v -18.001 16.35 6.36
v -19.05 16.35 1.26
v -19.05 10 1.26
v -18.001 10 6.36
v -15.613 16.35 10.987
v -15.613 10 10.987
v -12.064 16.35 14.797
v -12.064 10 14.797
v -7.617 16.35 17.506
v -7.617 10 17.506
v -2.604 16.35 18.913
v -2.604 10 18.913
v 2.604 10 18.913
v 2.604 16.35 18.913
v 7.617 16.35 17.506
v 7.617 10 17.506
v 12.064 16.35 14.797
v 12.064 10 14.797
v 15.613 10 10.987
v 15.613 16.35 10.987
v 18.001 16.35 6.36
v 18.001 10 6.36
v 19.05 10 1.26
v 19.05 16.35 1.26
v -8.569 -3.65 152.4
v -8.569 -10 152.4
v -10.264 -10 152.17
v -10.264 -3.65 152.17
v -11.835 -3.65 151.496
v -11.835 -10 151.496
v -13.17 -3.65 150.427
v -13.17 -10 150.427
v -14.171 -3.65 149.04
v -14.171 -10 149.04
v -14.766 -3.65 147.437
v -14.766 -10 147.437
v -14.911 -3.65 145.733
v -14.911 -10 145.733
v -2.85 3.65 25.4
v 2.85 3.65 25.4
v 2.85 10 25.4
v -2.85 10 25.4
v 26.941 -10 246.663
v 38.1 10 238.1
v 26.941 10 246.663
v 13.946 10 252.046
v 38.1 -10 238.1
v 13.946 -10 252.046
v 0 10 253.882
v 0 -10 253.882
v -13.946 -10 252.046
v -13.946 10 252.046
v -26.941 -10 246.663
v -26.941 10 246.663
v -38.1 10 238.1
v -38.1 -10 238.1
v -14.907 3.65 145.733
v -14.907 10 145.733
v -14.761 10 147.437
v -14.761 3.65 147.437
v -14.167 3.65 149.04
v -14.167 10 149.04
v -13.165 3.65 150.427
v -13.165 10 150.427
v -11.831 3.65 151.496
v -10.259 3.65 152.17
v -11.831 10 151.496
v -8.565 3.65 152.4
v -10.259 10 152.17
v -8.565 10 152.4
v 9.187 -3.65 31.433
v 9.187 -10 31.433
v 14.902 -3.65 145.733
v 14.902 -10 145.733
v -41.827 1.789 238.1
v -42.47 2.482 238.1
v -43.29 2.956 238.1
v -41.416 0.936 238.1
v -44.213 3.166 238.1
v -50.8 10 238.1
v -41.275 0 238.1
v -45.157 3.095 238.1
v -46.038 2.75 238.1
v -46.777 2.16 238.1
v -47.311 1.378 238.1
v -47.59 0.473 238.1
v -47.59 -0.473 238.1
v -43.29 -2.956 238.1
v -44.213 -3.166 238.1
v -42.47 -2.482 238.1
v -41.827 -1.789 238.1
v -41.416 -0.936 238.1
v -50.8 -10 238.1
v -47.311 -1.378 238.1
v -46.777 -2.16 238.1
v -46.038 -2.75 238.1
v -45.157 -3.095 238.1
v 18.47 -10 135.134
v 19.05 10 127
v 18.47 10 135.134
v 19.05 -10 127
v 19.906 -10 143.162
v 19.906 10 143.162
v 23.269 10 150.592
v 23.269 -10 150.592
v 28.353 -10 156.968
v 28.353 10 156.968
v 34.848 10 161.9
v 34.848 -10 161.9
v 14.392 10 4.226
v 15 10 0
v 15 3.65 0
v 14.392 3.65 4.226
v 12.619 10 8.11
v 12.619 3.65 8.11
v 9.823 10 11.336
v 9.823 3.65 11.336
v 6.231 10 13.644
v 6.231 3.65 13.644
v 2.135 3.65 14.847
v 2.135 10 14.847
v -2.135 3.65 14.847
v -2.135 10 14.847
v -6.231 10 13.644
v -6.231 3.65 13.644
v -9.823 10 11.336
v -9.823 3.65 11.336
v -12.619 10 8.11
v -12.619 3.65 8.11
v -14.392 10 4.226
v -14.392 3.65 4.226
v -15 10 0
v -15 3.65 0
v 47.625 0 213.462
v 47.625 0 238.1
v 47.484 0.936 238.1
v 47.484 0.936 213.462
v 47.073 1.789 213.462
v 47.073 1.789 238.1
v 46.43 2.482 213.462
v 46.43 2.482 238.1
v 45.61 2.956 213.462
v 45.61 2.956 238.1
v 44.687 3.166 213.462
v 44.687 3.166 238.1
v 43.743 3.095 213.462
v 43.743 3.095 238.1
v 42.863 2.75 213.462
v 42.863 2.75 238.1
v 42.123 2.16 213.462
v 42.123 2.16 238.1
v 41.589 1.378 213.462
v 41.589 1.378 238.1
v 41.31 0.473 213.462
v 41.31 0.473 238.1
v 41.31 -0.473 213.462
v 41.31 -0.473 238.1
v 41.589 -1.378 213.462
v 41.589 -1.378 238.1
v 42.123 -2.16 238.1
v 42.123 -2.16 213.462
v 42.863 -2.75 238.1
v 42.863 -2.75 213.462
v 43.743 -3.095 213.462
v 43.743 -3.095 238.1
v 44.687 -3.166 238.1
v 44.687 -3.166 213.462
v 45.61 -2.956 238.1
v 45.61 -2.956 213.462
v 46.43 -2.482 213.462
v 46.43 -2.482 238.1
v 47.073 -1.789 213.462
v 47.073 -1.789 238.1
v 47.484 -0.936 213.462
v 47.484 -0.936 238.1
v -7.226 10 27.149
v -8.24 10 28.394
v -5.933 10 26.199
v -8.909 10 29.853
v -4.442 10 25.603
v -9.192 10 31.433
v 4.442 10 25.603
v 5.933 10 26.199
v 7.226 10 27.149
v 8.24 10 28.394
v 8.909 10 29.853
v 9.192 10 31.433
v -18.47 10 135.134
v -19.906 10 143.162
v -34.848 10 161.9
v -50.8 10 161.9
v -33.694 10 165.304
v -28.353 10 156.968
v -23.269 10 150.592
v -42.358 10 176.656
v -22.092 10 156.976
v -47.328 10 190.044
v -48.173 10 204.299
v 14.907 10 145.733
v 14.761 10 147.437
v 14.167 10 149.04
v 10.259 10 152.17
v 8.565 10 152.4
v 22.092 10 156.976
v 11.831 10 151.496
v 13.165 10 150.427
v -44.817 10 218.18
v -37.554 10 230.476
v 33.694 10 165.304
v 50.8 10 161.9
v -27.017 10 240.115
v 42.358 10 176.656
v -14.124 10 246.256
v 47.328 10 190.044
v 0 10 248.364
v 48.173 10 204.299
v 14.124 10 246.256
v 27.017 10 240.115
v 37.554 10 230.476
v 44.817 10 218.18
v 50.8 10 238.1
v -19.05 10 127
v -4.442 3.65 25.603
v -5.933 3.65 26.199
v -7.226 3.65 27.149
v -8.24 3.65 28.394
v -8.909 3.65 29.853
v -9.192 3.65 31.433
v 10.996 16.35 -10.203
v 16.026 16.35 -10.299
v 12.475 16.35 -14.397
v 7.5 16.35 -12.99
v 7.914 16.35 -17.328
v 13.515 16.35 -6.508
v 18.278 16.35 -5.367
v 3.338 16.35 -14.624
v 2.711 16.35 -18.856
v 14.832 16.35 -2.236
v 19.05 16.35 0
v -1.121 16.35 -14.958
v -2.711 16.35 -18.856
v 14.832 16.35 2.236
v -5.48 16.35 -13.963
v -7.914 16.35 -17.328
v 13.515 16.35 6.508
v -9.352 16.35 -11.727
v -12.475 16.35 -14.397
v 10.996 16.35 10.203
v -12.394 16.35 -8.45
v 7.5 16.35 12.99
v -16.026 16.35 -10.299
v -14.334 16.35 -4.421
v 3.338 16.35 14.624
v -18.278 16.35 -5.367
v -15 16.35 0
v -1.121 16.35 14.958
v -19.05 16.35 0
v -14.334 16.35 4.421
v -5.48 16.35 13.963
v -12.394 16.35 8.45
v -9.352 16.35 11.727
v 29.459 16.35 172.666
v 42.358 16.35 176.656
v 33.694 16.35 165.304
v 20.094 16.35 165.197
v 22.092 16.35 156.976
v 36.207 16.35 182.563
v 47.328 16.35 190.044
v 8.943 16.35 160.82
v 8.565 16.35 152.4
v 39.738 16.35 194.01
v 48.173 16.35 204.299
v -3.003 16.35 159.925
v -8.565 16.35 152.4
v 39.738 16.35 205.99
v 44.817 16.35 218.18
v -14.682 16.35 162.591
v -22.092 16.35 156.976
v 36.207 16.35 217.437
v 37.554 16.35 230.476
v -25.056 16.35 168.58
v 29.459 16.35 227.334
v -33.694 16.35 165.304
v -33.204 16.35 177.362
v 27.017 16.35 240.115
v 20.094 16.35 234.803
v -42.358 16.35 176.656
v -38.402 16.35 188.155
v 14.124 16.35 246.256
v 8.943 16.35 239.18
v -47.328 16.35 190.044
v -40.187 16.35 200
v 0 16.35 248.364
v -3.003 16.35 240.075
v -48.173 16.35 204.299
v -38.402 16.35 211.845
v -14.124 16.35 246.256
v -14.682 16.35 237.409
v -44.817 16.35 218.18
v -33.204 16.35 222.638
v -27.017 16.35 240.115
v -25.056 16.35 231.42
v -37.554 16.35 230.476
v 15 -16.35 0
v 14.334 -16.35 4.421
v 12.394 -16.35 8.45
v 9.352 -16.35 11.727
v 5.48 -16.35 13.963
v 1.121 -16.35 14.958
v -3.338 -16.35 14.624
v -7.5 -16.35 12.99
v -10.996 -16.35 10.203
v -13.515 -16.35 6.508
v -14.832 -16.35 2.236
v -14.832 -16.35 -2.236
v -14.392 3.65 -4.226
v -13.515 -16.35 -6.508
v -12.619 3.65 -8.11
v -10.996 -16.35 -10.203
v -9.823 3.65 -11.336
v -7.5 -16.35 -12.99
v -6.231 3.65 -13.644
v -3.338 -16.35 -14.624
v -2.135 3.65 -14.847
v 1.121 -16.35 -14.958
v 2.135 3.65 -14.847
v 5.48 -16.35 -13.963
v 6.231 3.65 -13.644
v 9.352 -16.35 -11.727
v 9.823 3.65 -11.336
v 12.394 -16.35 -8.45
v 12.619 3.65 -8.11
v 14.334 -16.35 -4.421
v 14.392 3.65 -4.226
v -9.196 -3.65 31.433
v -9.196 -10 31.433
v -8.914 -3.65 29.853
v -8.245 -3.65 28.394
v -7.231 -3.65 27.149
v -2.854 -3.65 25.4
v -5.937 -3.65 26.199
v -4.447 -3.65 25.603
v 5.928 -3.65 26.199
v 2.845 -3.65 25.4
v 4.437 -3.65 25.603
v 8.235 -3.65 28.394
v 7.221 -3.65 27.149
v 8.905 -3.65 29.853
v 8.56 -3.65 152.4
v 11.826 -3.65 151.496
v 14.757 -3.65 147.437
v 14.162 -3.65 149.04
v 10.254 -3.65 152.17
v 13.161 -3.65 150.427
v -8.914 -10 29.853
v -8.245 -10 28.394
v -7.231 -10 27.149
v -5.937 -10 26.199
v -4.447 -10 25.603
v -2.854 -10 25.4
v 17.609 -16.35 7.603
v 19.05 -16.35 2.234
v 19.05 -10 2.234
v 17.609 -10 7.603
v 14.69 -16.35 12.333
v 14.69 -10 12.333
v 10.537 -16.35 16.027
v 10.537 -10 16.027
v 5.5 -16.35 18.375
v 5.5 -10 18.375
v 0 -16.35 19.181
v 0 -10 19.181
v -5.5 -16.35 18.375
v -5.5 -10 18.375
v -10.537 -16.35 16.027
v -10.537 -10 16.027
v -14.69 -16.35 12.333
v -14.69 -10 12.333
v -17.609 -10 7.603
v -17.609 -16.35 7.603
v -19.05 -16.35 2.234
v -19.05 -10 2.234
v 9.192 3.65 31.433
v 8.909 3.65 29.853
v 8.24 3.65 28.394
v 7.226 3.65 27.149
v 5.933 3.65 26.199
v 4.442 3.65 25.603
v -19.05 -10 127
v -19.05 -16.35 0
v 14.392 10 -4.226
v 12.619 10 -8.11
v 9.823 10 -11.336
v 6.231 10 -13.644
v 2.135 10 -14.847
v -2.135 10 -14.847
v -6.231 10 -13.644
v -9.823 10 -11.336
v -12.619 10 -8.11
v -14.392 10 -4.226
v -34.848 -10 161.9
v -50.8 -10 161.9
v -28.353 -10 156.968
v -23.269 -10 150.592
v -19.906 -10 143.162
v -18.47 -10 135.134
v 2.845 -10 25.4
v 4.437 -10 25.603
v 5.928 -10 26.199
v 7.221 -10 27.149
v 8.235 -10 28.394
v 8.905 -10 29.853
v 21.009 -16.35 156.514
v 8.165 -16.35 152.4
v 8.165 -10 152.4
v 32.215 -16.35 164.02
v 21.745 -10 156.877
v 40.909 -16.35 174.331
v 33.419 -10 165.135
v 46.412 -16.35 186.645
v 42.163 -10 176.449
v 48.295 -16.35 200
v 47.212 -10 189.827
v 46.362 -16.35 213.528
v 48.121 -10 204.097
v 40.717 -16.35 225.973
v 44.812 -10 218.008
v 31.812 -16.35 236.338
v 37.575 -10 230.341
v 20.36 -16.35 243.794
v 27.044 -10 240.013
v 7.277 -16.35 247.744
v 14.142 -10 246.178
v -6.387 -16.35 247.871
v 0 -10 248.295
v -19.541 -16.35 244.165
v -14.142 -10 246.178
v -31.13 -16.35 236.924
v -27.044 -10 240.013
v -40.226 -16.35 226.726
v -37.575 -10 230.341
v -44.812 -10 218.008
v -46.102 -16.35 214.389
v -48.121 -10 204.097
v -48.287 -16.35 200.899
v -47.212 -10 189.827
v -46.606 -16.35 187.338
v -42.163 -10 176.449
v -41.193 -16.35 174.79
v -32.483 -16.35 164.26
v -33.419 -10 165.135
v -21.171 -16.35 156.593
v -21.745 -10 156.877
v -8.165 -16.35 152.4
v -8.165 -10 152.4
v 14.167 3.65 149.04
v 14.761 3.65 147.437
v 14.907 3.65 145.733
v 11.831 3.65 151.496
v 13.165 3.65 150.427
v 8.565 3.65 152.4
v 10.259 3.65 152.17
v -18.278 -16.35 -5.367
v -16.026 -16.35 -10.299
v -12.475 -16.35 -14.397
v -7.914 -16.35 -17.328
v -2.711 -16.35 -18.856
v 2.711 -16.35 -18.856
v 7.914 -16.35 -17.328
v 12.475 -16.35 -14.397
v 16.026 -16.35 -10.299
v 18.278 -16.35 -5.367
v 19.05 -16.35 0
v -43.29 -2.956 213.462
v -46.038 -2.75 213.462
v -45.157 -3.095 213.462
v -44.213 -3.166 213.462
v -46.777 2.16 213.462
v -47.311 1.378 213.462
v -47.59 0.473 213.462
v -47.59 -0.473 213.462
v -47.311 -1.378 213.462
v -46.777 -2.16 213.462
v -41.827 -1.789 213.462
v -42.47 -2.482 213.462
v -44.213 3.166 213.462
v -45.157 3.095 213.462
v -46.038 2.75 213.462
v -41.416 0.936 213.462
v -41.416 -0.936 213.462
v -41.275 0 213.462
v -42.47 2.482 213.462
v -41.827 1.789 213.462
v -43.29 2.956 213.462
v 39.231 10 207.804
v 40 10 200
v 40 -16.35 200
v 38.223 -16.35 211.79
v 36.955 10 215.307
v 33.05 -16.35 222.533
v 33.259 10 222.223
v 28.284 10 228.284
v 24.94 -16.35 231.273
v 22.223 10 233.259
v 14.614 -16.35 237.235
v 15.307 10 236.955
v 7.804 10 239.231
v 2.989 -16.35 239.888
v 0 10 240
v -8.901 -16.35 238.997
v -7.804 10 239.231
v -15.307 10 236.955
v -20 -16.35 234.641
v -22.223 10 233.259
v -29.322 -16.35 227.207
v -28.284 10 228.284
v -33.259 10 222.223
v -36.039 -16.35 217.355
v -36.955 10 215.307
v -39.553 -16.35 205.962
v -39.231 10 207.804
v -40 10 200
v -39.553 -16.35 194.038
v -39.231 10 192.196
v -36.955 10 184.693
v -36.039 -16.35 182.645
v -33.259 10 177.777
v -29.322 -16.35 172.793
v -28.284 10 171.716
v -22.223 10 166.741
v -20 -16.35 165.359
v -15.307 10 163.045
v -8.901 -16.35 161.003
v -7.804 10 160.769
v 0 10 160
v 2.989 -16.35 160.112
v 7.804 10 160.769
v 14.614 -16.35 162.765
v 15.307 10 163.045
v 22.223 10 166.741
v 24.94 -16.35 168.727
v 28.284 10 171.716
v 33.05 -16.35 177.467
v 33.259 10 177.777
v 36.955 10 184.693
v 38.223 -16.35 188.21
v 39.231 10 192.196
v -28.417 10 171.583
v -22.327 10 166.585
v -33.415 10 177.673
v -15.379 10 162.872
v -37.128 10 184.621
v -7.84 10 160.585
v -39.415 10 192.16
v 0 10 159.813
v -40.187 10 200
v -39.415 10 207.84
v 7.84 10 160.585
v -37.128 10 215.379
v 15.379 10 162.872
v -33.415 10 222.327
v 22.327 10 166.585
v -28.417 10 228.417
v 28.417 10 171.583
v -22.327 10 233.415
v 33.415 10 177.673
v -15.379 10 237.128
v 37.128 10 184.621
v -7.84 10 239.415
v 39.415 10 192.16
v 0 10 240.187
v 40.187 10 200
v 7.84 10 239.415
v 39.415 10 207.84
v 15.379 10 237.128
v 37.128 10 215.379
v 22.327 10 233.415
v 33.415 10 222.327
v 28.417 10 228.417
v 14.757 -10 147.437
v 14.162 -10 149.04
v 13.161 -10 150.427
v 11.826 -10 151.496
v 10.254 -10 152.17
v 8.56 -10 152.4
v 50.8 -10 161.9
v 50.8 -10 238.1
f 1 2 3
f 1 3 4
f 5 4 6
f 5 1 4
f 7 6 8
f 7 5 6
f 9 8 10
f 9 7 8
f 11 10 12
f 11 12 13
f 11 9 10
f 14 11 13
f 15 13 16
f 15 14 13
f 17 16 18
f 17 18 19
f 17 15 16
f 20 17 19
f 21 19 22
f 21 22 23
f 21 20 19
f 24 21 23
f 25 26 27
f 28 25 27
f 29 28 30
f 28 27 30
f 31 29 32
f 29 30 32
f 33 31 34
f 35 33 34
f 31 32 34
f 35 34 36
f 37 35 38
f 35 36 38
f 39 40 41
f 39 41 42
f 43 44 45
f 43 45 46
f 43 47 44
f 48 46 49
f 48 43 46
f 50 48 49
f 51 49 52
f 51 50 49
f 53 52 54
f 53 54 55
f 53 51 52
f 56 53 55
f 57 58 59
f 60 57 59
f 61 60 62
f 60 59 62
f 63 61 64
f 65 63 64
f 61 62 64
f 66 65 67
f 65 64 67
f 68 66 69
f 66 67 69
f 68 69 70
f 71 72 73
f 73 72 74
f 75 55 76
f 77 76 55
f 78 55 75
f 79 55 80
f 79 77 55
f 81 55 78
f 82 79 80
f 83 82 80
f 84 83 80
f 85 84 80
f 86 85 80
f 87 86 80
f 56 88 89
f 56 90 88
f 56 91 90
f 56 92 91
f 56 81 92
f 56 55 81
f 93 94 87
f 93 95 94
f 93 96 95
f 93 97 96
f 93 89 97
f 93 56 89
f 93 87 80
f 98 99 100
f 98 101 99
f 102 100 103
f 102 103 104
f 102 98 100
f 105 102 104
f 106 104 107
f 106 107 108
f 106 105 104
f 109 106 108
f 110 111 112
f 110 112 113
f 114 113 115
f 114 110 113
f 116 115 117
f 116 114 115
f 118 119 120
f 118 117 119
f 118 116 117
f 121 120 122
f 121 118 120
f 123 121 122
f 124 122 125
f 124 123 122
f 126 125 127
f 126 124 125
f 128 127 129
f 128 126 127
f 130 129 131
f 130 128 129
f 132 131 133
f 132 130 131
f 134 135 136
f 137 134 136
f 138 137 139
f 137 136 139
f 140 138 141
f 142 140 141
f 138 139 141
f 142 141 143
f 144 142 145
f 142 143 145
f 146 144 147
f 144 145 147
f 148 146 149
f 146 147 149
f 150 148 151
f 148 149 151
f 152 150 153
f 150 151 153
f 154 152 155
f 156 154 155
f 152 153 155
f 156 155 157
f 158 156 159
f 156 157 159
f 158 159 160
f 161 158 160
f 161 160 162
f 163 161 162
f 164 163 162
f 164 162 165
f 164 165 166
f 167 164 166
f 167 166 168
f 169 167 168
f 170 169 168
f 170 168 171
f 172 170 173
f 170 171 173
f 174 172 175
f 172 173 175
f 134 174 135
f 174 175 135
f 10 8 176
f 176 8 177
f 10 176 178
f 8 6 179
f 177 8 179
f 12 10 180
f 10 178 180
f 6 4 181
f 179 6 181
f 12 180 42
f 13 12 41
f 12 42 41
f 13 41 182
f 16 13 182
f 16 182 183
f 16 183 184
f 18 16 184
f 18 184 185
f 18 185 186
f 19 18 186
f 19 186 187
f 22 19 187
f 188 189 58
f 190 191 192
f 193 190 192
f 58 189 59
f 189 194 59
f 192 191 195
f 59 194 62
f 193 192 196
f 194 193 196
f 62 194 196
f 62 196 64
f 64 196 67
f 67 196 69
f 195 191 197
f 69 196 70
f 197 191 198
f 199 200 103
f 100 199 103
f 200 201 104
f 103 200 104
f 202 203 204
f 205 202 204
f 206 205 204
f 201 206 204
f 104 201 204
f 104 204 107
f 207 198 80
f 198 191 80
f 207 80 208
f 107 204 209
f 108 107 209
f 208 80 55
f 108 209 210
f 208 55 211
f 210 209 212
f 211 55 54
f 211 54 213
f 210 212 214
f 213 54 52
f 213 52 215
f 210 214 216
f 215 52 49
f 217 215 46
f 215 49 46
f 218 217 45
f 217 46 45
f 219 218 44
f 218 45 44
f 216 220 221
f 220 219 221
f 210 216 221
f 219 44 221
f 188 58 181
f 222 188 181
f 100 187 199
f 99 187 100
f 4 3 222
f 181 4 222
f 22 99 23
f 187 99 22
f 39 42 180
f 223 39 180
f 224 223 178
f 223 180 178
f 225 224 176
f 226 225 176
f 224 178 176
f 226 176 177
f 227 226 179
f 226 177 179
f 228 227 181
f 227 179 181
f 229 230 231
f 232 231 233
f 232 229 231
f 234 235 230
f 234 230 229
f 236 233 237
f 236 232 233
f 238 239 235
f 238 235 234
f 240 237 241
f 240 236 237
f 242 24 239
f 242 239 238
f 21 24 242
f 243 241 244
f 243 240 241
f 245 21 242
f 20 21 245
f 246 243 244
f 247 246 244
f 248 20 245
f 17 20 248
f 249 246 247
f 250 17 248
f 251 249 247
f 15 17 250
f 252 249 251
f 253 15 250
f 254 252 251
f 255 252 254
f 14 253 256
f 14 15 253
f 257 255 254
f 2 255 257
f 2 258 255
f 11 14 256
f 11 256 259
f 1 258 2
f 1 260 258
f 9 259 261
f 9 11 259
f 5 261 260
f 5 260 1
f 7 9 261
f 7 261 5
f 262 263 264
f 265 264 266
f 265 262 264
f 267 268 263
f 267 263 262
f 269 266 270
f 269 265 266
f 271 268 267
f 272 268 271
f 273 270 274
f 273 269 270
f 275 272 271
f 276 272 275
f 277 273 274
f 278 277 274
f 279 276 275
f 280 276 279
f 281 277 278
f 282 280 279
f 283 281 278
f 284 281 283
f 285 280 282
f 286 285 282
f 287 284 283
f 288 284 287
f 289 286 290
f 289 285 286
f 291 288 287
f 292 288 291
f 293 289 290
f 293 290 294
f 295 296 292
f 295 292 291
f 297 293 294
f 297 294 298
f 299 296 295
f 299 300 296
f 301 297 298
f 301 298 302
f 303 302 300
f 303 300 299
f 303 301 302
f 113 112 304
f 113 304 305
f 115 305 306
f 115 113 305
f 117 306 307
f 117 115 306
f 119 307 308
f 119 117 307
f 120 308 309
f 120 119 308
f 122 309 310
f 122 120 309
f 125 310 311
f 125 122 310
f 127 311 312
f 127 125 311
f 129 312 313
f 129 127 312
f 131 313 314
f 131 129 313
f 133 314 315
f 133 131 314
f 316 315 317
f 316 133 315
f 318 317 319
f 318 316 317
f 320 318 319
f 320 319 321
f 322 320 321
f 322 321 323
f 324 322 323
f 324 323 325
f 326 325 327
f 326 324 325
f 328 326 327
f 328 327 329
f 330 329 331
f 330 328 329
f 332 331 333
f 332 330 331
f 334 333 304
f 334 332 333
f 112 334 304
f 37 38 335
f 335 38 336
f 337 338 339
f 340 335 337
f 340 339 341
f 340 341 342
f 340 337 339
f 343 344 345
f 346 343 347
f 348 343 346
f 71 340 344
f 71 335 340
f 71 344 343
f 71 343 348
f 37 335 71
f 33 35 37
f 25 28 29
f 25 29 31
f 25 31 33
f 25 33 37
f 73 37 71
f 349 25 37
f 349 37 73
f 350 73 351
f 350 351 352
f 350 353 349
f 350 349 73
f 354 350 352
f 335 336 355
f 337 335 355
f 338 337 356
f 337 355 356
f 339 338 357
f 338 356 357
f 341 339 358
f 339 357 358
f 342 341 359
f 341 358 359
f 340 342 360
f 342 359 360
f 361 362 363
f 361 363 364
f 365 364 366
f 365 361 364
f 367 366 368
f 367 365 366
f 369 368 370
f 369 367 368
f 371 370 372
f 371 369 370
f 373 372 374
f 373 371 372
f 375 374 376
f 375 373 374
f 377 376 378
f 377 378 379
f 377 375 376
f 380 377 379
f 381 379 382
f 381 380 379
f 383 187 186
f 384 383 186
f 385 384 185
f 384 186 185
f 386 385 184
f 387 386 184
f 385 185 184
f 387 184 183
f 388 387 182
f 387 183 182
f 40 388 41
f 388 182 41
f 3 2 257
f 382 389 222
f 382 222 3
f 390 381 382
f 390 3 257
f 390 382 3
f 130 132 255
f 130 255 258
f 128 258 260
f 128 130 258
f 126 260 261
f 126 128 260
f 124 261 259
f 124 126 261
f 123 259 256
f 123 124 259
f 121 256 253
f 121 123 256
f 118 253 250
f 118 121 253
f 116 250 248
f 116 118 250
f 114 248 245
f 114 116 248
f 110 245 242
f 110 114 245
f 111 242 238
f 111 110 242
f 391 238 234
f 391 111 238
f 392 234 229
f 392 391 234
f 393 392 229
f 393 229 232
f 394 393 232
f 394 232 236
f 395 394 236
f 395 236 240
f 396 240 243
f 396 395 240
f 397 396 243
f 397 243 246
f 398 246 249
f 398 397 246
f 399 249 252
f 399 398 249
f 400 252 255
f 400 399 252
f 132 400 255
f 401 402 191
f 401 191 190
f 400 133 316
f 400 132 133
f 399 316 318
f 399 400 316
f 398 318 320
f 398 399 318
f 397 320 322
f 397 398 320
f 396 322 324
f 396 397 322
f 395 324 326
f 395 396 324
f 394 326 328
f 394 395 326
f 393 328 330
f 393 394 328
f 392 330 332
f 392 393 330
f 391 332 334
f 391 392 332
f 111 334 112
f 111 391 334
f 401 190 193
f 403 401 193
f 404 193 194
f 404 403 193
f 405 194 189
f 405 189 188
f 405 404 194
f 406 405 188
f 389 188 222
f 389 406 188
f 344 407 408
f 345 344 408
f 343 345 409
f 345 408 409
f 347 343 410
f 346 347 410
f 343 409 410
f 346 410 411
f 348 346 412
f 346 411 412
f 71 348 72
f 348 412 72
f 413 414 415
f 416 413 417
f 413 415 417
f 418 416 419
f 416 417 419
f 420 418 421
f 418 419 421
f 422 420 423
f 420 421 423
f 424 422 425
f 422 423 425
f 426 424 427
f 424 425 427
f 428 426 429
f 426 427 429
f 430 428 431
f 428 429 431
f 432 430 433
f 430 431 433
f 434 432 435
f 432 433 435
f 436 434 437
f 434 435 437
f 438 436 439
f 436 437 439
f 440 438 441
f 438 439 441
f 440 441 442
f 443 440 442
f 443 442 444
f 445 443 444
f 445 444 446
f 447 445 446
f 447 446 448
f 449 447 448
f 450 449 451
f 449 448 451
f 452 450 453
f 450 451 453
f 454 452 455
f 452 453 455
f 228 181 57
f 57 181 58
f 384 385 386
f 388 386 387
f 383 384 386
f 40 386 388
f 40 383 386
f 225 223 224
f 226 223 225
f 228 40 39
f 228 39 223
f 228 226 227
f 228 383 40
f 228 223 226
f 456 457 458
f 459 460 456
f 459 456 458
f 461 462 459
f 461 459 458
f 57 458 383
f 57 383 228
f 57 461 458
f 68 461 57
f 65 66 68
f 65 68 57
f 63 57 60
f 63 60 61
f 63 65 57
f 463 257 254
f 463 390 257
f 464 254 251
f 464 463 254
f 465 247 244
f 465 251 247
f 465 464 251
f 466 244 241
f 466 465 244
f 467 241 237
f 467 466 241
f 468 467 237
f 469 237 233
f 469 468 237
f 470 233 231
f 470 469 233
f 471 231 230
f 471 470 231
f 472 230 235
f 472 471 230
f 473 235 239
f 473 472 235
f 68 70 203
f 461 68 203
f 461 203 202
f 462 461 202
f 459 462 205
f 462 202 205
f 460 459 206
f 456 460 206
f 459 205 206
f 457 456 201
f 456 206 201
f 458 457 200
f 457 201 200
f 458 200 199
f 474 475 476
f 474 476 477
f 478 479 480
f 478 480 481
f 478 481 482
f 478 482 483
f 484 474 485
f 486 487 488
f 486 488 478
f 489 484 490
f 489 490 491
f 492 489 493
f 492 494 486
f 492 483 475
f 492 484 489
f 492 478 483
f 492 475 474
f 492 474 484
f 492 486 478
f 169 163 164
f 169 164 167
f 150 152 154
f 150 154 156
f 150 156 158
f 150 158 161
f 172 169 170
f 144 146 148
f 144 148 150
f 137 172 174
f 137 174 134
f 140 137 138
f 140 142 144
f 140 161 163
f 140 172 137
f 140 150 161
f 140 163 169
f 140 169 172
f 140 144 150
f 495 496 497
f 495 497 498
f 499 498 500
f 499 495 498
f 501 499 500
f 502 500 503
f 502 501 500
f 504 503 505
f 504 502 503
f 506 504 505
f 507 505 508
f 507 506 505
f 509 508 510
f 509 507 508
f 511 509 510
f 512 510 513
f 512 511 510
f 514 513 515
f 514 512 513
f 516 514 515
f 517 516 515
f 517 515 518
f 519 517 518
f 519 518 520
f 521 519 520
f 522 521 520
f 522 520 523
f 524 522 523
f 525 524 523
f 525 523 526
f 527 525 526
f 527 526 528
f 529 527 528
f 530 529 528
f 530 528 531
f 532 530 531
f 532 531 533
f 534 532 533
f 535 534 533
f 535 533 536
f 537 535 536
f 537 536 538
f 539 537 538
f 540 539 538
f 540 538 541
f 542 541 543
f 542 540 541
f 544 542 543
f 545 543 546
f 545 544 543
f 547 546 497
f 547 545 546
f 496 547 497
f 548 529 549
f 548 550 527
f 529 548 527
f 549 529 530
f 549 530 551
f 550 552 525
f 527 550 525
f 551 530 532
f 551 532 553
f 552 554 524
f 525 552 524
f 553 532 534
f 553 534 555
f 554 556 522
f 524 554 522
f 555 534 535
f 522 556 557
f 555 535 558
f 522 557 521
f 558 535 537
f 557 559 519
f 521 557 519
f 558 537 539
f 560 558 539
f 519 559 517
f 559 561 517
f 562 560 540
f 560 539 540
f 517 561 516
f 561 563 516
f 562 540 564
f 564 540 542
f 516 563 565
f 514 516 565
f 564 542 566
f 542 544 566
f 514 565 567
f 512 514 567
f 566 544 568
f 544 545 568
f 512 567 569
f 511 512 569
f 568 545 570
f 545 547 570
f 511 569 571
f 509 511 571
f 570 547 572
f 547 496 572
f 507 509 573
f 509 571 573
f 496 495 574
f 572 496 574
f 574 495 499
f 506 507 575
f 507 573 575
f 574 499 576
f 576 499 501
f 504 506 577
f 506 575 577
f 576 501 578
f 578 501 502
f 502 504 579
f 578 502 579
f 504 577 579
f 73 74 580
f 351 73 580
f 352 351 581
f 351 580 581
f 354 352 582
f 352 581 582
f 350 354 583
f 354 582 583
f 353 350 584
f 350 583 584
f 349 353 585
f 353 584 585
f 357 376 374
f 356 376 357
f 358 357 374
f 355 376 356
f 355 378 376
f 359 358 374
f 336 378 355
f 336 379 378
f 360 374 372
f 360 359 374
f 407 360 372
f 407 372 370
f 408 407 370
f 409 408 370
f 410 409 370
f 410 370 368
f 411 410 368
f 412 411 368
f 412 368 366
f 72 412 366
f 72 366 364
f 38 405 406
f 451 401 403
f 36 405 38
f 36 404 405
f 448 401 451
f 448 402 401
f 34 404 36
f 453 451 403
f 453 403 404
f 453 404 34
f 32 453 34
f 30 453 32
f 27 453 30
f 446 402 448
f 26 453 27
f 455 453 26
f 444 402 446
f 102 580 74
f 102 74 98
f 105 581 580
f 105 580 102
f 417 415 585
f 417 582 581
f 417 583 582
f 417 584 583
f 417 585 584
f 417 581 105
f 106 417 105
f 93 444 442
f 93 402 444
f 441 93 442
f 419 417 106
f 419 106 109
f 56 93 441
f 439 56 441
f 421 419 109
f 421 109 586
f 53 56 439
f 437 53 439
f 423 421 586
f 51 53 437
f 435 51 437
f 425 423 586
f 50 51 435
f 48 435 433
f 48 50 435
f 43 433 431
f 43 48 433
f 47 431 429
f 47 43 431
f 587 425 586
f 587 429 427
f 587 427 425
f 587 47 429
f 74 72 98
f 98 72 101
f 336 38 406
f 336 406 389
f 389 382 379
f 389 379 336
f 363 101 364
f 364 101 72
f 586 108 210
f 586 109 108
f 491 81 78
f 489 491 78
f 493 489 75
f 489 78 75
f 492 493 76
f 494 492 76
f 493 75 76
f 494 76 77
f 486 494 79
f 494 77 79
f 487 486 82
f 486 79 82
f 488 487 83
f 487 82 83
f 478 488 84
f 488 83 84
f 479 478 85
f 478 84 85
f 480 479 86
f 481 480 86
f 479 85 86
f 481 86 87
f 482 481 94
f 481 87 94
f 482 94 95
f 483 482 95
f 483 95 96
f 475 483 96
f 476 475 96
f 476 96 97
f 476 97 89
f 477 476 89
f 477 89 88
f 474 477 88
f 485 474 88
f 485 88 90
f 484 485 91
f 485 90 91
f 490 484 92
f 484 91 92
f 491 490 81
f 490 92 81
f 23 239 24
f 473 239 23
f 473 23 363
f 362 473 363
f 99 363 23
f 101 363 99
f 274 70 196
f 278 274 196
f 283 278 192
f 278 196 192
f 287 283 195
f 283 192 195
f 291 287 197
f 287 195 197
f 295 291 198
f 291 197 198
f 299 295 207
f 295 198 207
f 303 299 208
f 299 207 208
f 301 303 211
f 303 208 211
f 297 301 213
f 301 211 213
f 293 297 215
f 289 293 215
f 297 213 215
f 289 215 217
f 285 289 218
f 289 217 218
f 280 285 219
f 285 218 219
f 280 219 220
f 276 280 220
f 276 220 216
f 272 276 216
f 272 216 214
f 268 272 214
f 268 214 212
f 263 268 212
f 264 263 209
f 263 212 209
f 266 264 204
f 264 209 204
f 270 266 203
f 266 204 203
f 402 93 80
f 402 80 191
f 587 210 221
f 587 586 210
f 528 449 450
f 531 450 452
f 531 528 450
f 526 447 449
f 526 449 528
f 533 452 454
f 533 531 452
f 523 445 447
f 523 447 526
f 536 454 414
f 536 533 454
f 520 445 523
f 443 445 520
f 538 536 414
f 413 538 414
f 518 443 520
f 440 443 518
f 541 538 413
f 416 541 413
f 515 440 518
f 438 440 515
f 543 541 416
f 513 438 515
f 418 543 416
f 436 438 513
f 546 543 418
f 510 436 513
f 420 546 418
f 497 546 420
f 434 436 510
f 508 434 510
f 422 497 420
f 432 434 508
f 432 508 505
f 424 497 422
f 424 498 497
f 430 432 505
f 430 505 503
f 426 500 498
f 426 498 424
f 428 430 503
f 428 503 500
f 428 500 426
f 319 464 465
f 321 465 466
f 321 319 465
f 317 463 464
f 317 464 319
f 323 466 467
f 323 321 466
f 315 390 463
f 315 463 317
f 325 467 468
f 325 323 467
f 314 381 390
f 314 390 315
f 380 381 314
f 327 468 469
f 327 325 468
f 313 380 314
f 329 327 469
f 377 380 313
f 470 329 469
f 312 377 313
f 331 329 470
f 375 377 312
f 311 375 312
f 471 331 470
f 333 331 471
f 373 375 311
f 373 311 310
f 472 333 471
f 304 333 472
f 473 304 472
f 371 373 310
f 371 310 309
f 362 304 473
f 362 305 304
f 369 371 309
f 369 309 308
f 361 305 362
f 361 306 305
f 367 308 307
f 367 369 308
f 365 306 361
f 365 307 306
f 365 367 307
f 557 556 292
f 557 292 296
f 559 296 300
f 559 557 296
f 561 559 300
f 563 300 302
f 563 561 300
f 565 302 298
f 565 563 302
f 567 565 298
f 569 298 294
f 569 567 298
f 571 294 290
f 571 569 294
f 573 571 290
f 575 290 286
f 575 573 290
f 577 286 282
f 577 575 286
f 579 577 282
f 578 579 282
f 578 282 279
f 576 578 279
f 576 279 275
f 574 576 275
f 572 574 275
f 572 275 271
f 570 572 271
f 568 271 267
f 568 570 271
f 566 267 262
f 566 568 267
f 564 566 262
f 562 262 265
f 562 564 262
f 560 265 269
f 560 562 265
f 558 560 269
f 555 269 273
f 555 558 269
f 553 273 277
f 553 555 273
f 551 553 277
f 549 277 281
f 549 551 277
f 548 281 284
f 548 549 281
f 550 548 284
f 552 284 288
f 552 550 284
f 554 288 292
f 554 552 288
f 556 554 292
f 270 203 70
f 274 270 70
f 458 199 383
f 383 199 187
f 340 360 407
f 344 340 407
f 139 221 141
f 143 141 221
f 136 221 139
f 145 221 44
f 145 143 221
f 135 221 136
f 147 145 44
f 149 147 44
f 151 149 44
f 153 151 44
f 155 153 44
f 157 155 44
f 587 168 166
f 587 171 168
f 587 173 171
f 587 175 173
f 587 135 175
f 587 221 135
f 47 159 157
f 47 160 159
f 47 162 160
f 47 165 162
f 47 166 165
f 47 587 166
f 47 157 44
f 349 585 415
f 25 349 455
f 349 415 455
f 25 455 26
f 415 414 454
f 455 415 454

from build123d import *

# Parameters (mm, degrees)
F0_R      = 15
F0_R_2    = 40
F1_DEPTH  = 10
F3_DEPTH  = 6.35
F5_DEPTH  = 6.35
F6_R      = 40
F6_R_2    = 15
F7_DEPTH  = 6.35
F8_R      = 40.1872824047
F8_R_2    = 15
F9_DEPTH  = 6.35
F10_R     = 3.175
F11_DEPTH = 24.638


with BuildPart() as f1:
    # F0 (on Front) → F1 (new body, symmetric)
    with BuildSketch(Plane.XZ):
        with BuildLine():
            Line((-38.1, 238.1), (-50.8, 238.1))
            Line((-50.8, 238.1), (-50.8, 161.9))
            Line((-50.8, 161.9), (-34.8479530832, 161.9))
            ThreePointArc((-34.8479530832, 161.9), (-21.3567895263, 146.9813784556), (-19.05, 127))
            Line((-19.05, 127), (-19.05, 0))
            ThreePointArc((-19.05, 0), (0, -19.05), (19.05, 0))
            Line((19.05, 0), (19.05, 127))
            ThreePointArc((19.05, 127), (21.3567895263, 146.9813784556), (34.8479530832, 161.9))
            Line((34.8479530832, 161.9), (50.8, 161.9))
            Line((50.8, 161.9), (50.8, 238.1))
            Line((50.8, 238.1), (38.1, 238.1))
            ThreePointArc((38.1, 238.1), (0, 253.8815367264), (-38.1, 238.1))
        make_face()
        Circle(F0_R, mode=Mode.SUBTRACT)
        with Locations((0, 200)):
            Circle(F0_R_2, mode=Mode.SUBTRACT)
    extrude(amount=F1_DEPTH, both=True)

    # F2 (on face) → F3 (cut)
    with BuildSketch(Plane(origin=(0, 10, 0), x_dir=(-1, 0, 0), z_dir=(0, 1, 0))):
        with BuildLine():
            Line((8.5645674547, 152.4), (-8.5645674547, 152.4))
            ThreePointArc((-8.5645674547, 152.4), (-13.165442891, 150.4265791688), (-14.9066448066, 145.7328961324))
            Line((-14.9066448066, 145.7328961324), (-9.1916448066, 31.4328961324))
            ThreePointArc((-9.1916448066, 31.4328961324), (-7.2261466235, 27.1491245638), (-2.8495674547, 25.4))
            Line((-2.8495674547, 25.4), (2.8495674547, 25.4))
            ThreePointArc((2.8495674547, 25.4), (7.2261466235, 27.1491245638), (9.1916448066, 31.4328961324))
            Line((9.1916448066, 31.4328961324), (14.9066448066, 145.7328961324))
            ThreePointArc((14.9066448066, 145.7328961324), (13.165442891, 150.4265791688), (8.5645674547, 152.4))
        make_face()
    extrude(amount=-F3_DEPTH, mode=Mode.SUBTRACT)

    # F4 (on face) → F5 (cut)
    with BuildSketch(Plane.XZ.offset(10)):
        with BuildLine():
            Line((8.5598, 152.4), (-8.5693349095, 152.4))
            ThreePointArc((-8.5693349095, 152.4), (-13.1702103457, 150.4265791688), (-14.9114122614, 145.7328961324))
            Line((-14.9114122614, 145.7328961324), (-9.1964122614, 31.4328961324))
            ThreePointArc((-9.1964122614, 31.4328961324), (-7.2309140782, 27.1491245638), (-2.8543349095, 25.4))
            Line((-2.8543349095, 25.4), (2.8448, 25.4))
            ThreePointArc((2.8448, 25.4), (7.2213791688, 27.1491245638), (9.1868773519, 31.4328961324))
            Line((9.1868773519, 31.4328961324), (14.9018773519, 145.7328961324))
            ThreePointArc((14.9018773519, 145.7328961324), (13.1606754362, 150.4265791688), (8.5598, 152.4))
        make_face()
    extrude(amount=-F5_DEPTH, mode=Mode.SUBTRACT)

    # F6 (on face) → F7 (join, symmetric)
    with BuildSketch(Plane.XZ.offset(10)):
        with BuildLine():
            ThreePointArc((8.1649718925, 152.4), (36.9239471908, 168.8704498932), (48.295204379, 200))
            ThreePointArc((48.295204379, 200), (-31.1295501068, 236.9239471908), (-8.1649718925, 152.4))
            Line((-8.1649718925, 152.4), (8.1649718925, 152.4))
        make_face()
        with Locations((0, 200)):
            Circle(F6_R, mode=Mode.SUBTRACT)
        with BuildLine():
            Line((19.05, 0), (19.05, 2.2343365964))
            ThreePointArc((19.05, 2.2343365964), (0, 19.1805828907), (-19.05, 2.2343365964))
            Line((-19.05, 2.2343365964), (-19.05, 0))
            ThreePointArc((-19.05, 0), (0, -19.05), (19.05, 0))
        make_face()
        Circle(F6_R_2, mode=Mode.SUBTRACT)
    extrude(amount=F7_DEPTH, both=True)

    # F8 (on face) → F9 (join, symmetric)
    with BuildSketch(Plane(origin=(0, 10, 0), x_dir=(-1, 0, 0), z_dir=(0, 1, 0))):
        with BuildLine():
            ThreePointArc((8.5645674547, 152.4), (37.1034478409, 168.976686605), (48.364365143, 200))
            ThreePointArc((48.364365143, 200), (-31.023313395, 237.1034478409), (-8.5645674547, 152.4))
            Line((-8.5645674547, 152.4), (8.5645674547, 152.4))
        make_face()
        with Locations((0, 200)):
            Circle(F8_R, mode=Mode.SUBTRACT)
        with BuildLine():
            Line((19.05, 0), (19.05, 1.2599718654))
            ThreePointArc((19.05, 1.2599718654), (0, 19.091621961), (-19.05, 1.2599718654))
            Line((-19.05, 1.2599718654), (-19.05, 0))
            ThreePointArc((-19.05, 0), (0, -19.05), (19.05, 0))
        make_face()
        Circle(F8_R_2, mode=Mode.SUBTRACT)
    extrude(amount=F9_DEPTH, both=True)

    # F10 (on face) → F11 (cut)
    with BuildSketch(Plane.XY.offset(238.1)):
        with Locations((-44.45, 0)):
            Circle(F10_R)
        with Locations((44.45, 0)):
            Circle(F10_R)
    extrude(amount=-F11_DEPTH, mode=Mode.SUBTRACT)


solid = f1.part
